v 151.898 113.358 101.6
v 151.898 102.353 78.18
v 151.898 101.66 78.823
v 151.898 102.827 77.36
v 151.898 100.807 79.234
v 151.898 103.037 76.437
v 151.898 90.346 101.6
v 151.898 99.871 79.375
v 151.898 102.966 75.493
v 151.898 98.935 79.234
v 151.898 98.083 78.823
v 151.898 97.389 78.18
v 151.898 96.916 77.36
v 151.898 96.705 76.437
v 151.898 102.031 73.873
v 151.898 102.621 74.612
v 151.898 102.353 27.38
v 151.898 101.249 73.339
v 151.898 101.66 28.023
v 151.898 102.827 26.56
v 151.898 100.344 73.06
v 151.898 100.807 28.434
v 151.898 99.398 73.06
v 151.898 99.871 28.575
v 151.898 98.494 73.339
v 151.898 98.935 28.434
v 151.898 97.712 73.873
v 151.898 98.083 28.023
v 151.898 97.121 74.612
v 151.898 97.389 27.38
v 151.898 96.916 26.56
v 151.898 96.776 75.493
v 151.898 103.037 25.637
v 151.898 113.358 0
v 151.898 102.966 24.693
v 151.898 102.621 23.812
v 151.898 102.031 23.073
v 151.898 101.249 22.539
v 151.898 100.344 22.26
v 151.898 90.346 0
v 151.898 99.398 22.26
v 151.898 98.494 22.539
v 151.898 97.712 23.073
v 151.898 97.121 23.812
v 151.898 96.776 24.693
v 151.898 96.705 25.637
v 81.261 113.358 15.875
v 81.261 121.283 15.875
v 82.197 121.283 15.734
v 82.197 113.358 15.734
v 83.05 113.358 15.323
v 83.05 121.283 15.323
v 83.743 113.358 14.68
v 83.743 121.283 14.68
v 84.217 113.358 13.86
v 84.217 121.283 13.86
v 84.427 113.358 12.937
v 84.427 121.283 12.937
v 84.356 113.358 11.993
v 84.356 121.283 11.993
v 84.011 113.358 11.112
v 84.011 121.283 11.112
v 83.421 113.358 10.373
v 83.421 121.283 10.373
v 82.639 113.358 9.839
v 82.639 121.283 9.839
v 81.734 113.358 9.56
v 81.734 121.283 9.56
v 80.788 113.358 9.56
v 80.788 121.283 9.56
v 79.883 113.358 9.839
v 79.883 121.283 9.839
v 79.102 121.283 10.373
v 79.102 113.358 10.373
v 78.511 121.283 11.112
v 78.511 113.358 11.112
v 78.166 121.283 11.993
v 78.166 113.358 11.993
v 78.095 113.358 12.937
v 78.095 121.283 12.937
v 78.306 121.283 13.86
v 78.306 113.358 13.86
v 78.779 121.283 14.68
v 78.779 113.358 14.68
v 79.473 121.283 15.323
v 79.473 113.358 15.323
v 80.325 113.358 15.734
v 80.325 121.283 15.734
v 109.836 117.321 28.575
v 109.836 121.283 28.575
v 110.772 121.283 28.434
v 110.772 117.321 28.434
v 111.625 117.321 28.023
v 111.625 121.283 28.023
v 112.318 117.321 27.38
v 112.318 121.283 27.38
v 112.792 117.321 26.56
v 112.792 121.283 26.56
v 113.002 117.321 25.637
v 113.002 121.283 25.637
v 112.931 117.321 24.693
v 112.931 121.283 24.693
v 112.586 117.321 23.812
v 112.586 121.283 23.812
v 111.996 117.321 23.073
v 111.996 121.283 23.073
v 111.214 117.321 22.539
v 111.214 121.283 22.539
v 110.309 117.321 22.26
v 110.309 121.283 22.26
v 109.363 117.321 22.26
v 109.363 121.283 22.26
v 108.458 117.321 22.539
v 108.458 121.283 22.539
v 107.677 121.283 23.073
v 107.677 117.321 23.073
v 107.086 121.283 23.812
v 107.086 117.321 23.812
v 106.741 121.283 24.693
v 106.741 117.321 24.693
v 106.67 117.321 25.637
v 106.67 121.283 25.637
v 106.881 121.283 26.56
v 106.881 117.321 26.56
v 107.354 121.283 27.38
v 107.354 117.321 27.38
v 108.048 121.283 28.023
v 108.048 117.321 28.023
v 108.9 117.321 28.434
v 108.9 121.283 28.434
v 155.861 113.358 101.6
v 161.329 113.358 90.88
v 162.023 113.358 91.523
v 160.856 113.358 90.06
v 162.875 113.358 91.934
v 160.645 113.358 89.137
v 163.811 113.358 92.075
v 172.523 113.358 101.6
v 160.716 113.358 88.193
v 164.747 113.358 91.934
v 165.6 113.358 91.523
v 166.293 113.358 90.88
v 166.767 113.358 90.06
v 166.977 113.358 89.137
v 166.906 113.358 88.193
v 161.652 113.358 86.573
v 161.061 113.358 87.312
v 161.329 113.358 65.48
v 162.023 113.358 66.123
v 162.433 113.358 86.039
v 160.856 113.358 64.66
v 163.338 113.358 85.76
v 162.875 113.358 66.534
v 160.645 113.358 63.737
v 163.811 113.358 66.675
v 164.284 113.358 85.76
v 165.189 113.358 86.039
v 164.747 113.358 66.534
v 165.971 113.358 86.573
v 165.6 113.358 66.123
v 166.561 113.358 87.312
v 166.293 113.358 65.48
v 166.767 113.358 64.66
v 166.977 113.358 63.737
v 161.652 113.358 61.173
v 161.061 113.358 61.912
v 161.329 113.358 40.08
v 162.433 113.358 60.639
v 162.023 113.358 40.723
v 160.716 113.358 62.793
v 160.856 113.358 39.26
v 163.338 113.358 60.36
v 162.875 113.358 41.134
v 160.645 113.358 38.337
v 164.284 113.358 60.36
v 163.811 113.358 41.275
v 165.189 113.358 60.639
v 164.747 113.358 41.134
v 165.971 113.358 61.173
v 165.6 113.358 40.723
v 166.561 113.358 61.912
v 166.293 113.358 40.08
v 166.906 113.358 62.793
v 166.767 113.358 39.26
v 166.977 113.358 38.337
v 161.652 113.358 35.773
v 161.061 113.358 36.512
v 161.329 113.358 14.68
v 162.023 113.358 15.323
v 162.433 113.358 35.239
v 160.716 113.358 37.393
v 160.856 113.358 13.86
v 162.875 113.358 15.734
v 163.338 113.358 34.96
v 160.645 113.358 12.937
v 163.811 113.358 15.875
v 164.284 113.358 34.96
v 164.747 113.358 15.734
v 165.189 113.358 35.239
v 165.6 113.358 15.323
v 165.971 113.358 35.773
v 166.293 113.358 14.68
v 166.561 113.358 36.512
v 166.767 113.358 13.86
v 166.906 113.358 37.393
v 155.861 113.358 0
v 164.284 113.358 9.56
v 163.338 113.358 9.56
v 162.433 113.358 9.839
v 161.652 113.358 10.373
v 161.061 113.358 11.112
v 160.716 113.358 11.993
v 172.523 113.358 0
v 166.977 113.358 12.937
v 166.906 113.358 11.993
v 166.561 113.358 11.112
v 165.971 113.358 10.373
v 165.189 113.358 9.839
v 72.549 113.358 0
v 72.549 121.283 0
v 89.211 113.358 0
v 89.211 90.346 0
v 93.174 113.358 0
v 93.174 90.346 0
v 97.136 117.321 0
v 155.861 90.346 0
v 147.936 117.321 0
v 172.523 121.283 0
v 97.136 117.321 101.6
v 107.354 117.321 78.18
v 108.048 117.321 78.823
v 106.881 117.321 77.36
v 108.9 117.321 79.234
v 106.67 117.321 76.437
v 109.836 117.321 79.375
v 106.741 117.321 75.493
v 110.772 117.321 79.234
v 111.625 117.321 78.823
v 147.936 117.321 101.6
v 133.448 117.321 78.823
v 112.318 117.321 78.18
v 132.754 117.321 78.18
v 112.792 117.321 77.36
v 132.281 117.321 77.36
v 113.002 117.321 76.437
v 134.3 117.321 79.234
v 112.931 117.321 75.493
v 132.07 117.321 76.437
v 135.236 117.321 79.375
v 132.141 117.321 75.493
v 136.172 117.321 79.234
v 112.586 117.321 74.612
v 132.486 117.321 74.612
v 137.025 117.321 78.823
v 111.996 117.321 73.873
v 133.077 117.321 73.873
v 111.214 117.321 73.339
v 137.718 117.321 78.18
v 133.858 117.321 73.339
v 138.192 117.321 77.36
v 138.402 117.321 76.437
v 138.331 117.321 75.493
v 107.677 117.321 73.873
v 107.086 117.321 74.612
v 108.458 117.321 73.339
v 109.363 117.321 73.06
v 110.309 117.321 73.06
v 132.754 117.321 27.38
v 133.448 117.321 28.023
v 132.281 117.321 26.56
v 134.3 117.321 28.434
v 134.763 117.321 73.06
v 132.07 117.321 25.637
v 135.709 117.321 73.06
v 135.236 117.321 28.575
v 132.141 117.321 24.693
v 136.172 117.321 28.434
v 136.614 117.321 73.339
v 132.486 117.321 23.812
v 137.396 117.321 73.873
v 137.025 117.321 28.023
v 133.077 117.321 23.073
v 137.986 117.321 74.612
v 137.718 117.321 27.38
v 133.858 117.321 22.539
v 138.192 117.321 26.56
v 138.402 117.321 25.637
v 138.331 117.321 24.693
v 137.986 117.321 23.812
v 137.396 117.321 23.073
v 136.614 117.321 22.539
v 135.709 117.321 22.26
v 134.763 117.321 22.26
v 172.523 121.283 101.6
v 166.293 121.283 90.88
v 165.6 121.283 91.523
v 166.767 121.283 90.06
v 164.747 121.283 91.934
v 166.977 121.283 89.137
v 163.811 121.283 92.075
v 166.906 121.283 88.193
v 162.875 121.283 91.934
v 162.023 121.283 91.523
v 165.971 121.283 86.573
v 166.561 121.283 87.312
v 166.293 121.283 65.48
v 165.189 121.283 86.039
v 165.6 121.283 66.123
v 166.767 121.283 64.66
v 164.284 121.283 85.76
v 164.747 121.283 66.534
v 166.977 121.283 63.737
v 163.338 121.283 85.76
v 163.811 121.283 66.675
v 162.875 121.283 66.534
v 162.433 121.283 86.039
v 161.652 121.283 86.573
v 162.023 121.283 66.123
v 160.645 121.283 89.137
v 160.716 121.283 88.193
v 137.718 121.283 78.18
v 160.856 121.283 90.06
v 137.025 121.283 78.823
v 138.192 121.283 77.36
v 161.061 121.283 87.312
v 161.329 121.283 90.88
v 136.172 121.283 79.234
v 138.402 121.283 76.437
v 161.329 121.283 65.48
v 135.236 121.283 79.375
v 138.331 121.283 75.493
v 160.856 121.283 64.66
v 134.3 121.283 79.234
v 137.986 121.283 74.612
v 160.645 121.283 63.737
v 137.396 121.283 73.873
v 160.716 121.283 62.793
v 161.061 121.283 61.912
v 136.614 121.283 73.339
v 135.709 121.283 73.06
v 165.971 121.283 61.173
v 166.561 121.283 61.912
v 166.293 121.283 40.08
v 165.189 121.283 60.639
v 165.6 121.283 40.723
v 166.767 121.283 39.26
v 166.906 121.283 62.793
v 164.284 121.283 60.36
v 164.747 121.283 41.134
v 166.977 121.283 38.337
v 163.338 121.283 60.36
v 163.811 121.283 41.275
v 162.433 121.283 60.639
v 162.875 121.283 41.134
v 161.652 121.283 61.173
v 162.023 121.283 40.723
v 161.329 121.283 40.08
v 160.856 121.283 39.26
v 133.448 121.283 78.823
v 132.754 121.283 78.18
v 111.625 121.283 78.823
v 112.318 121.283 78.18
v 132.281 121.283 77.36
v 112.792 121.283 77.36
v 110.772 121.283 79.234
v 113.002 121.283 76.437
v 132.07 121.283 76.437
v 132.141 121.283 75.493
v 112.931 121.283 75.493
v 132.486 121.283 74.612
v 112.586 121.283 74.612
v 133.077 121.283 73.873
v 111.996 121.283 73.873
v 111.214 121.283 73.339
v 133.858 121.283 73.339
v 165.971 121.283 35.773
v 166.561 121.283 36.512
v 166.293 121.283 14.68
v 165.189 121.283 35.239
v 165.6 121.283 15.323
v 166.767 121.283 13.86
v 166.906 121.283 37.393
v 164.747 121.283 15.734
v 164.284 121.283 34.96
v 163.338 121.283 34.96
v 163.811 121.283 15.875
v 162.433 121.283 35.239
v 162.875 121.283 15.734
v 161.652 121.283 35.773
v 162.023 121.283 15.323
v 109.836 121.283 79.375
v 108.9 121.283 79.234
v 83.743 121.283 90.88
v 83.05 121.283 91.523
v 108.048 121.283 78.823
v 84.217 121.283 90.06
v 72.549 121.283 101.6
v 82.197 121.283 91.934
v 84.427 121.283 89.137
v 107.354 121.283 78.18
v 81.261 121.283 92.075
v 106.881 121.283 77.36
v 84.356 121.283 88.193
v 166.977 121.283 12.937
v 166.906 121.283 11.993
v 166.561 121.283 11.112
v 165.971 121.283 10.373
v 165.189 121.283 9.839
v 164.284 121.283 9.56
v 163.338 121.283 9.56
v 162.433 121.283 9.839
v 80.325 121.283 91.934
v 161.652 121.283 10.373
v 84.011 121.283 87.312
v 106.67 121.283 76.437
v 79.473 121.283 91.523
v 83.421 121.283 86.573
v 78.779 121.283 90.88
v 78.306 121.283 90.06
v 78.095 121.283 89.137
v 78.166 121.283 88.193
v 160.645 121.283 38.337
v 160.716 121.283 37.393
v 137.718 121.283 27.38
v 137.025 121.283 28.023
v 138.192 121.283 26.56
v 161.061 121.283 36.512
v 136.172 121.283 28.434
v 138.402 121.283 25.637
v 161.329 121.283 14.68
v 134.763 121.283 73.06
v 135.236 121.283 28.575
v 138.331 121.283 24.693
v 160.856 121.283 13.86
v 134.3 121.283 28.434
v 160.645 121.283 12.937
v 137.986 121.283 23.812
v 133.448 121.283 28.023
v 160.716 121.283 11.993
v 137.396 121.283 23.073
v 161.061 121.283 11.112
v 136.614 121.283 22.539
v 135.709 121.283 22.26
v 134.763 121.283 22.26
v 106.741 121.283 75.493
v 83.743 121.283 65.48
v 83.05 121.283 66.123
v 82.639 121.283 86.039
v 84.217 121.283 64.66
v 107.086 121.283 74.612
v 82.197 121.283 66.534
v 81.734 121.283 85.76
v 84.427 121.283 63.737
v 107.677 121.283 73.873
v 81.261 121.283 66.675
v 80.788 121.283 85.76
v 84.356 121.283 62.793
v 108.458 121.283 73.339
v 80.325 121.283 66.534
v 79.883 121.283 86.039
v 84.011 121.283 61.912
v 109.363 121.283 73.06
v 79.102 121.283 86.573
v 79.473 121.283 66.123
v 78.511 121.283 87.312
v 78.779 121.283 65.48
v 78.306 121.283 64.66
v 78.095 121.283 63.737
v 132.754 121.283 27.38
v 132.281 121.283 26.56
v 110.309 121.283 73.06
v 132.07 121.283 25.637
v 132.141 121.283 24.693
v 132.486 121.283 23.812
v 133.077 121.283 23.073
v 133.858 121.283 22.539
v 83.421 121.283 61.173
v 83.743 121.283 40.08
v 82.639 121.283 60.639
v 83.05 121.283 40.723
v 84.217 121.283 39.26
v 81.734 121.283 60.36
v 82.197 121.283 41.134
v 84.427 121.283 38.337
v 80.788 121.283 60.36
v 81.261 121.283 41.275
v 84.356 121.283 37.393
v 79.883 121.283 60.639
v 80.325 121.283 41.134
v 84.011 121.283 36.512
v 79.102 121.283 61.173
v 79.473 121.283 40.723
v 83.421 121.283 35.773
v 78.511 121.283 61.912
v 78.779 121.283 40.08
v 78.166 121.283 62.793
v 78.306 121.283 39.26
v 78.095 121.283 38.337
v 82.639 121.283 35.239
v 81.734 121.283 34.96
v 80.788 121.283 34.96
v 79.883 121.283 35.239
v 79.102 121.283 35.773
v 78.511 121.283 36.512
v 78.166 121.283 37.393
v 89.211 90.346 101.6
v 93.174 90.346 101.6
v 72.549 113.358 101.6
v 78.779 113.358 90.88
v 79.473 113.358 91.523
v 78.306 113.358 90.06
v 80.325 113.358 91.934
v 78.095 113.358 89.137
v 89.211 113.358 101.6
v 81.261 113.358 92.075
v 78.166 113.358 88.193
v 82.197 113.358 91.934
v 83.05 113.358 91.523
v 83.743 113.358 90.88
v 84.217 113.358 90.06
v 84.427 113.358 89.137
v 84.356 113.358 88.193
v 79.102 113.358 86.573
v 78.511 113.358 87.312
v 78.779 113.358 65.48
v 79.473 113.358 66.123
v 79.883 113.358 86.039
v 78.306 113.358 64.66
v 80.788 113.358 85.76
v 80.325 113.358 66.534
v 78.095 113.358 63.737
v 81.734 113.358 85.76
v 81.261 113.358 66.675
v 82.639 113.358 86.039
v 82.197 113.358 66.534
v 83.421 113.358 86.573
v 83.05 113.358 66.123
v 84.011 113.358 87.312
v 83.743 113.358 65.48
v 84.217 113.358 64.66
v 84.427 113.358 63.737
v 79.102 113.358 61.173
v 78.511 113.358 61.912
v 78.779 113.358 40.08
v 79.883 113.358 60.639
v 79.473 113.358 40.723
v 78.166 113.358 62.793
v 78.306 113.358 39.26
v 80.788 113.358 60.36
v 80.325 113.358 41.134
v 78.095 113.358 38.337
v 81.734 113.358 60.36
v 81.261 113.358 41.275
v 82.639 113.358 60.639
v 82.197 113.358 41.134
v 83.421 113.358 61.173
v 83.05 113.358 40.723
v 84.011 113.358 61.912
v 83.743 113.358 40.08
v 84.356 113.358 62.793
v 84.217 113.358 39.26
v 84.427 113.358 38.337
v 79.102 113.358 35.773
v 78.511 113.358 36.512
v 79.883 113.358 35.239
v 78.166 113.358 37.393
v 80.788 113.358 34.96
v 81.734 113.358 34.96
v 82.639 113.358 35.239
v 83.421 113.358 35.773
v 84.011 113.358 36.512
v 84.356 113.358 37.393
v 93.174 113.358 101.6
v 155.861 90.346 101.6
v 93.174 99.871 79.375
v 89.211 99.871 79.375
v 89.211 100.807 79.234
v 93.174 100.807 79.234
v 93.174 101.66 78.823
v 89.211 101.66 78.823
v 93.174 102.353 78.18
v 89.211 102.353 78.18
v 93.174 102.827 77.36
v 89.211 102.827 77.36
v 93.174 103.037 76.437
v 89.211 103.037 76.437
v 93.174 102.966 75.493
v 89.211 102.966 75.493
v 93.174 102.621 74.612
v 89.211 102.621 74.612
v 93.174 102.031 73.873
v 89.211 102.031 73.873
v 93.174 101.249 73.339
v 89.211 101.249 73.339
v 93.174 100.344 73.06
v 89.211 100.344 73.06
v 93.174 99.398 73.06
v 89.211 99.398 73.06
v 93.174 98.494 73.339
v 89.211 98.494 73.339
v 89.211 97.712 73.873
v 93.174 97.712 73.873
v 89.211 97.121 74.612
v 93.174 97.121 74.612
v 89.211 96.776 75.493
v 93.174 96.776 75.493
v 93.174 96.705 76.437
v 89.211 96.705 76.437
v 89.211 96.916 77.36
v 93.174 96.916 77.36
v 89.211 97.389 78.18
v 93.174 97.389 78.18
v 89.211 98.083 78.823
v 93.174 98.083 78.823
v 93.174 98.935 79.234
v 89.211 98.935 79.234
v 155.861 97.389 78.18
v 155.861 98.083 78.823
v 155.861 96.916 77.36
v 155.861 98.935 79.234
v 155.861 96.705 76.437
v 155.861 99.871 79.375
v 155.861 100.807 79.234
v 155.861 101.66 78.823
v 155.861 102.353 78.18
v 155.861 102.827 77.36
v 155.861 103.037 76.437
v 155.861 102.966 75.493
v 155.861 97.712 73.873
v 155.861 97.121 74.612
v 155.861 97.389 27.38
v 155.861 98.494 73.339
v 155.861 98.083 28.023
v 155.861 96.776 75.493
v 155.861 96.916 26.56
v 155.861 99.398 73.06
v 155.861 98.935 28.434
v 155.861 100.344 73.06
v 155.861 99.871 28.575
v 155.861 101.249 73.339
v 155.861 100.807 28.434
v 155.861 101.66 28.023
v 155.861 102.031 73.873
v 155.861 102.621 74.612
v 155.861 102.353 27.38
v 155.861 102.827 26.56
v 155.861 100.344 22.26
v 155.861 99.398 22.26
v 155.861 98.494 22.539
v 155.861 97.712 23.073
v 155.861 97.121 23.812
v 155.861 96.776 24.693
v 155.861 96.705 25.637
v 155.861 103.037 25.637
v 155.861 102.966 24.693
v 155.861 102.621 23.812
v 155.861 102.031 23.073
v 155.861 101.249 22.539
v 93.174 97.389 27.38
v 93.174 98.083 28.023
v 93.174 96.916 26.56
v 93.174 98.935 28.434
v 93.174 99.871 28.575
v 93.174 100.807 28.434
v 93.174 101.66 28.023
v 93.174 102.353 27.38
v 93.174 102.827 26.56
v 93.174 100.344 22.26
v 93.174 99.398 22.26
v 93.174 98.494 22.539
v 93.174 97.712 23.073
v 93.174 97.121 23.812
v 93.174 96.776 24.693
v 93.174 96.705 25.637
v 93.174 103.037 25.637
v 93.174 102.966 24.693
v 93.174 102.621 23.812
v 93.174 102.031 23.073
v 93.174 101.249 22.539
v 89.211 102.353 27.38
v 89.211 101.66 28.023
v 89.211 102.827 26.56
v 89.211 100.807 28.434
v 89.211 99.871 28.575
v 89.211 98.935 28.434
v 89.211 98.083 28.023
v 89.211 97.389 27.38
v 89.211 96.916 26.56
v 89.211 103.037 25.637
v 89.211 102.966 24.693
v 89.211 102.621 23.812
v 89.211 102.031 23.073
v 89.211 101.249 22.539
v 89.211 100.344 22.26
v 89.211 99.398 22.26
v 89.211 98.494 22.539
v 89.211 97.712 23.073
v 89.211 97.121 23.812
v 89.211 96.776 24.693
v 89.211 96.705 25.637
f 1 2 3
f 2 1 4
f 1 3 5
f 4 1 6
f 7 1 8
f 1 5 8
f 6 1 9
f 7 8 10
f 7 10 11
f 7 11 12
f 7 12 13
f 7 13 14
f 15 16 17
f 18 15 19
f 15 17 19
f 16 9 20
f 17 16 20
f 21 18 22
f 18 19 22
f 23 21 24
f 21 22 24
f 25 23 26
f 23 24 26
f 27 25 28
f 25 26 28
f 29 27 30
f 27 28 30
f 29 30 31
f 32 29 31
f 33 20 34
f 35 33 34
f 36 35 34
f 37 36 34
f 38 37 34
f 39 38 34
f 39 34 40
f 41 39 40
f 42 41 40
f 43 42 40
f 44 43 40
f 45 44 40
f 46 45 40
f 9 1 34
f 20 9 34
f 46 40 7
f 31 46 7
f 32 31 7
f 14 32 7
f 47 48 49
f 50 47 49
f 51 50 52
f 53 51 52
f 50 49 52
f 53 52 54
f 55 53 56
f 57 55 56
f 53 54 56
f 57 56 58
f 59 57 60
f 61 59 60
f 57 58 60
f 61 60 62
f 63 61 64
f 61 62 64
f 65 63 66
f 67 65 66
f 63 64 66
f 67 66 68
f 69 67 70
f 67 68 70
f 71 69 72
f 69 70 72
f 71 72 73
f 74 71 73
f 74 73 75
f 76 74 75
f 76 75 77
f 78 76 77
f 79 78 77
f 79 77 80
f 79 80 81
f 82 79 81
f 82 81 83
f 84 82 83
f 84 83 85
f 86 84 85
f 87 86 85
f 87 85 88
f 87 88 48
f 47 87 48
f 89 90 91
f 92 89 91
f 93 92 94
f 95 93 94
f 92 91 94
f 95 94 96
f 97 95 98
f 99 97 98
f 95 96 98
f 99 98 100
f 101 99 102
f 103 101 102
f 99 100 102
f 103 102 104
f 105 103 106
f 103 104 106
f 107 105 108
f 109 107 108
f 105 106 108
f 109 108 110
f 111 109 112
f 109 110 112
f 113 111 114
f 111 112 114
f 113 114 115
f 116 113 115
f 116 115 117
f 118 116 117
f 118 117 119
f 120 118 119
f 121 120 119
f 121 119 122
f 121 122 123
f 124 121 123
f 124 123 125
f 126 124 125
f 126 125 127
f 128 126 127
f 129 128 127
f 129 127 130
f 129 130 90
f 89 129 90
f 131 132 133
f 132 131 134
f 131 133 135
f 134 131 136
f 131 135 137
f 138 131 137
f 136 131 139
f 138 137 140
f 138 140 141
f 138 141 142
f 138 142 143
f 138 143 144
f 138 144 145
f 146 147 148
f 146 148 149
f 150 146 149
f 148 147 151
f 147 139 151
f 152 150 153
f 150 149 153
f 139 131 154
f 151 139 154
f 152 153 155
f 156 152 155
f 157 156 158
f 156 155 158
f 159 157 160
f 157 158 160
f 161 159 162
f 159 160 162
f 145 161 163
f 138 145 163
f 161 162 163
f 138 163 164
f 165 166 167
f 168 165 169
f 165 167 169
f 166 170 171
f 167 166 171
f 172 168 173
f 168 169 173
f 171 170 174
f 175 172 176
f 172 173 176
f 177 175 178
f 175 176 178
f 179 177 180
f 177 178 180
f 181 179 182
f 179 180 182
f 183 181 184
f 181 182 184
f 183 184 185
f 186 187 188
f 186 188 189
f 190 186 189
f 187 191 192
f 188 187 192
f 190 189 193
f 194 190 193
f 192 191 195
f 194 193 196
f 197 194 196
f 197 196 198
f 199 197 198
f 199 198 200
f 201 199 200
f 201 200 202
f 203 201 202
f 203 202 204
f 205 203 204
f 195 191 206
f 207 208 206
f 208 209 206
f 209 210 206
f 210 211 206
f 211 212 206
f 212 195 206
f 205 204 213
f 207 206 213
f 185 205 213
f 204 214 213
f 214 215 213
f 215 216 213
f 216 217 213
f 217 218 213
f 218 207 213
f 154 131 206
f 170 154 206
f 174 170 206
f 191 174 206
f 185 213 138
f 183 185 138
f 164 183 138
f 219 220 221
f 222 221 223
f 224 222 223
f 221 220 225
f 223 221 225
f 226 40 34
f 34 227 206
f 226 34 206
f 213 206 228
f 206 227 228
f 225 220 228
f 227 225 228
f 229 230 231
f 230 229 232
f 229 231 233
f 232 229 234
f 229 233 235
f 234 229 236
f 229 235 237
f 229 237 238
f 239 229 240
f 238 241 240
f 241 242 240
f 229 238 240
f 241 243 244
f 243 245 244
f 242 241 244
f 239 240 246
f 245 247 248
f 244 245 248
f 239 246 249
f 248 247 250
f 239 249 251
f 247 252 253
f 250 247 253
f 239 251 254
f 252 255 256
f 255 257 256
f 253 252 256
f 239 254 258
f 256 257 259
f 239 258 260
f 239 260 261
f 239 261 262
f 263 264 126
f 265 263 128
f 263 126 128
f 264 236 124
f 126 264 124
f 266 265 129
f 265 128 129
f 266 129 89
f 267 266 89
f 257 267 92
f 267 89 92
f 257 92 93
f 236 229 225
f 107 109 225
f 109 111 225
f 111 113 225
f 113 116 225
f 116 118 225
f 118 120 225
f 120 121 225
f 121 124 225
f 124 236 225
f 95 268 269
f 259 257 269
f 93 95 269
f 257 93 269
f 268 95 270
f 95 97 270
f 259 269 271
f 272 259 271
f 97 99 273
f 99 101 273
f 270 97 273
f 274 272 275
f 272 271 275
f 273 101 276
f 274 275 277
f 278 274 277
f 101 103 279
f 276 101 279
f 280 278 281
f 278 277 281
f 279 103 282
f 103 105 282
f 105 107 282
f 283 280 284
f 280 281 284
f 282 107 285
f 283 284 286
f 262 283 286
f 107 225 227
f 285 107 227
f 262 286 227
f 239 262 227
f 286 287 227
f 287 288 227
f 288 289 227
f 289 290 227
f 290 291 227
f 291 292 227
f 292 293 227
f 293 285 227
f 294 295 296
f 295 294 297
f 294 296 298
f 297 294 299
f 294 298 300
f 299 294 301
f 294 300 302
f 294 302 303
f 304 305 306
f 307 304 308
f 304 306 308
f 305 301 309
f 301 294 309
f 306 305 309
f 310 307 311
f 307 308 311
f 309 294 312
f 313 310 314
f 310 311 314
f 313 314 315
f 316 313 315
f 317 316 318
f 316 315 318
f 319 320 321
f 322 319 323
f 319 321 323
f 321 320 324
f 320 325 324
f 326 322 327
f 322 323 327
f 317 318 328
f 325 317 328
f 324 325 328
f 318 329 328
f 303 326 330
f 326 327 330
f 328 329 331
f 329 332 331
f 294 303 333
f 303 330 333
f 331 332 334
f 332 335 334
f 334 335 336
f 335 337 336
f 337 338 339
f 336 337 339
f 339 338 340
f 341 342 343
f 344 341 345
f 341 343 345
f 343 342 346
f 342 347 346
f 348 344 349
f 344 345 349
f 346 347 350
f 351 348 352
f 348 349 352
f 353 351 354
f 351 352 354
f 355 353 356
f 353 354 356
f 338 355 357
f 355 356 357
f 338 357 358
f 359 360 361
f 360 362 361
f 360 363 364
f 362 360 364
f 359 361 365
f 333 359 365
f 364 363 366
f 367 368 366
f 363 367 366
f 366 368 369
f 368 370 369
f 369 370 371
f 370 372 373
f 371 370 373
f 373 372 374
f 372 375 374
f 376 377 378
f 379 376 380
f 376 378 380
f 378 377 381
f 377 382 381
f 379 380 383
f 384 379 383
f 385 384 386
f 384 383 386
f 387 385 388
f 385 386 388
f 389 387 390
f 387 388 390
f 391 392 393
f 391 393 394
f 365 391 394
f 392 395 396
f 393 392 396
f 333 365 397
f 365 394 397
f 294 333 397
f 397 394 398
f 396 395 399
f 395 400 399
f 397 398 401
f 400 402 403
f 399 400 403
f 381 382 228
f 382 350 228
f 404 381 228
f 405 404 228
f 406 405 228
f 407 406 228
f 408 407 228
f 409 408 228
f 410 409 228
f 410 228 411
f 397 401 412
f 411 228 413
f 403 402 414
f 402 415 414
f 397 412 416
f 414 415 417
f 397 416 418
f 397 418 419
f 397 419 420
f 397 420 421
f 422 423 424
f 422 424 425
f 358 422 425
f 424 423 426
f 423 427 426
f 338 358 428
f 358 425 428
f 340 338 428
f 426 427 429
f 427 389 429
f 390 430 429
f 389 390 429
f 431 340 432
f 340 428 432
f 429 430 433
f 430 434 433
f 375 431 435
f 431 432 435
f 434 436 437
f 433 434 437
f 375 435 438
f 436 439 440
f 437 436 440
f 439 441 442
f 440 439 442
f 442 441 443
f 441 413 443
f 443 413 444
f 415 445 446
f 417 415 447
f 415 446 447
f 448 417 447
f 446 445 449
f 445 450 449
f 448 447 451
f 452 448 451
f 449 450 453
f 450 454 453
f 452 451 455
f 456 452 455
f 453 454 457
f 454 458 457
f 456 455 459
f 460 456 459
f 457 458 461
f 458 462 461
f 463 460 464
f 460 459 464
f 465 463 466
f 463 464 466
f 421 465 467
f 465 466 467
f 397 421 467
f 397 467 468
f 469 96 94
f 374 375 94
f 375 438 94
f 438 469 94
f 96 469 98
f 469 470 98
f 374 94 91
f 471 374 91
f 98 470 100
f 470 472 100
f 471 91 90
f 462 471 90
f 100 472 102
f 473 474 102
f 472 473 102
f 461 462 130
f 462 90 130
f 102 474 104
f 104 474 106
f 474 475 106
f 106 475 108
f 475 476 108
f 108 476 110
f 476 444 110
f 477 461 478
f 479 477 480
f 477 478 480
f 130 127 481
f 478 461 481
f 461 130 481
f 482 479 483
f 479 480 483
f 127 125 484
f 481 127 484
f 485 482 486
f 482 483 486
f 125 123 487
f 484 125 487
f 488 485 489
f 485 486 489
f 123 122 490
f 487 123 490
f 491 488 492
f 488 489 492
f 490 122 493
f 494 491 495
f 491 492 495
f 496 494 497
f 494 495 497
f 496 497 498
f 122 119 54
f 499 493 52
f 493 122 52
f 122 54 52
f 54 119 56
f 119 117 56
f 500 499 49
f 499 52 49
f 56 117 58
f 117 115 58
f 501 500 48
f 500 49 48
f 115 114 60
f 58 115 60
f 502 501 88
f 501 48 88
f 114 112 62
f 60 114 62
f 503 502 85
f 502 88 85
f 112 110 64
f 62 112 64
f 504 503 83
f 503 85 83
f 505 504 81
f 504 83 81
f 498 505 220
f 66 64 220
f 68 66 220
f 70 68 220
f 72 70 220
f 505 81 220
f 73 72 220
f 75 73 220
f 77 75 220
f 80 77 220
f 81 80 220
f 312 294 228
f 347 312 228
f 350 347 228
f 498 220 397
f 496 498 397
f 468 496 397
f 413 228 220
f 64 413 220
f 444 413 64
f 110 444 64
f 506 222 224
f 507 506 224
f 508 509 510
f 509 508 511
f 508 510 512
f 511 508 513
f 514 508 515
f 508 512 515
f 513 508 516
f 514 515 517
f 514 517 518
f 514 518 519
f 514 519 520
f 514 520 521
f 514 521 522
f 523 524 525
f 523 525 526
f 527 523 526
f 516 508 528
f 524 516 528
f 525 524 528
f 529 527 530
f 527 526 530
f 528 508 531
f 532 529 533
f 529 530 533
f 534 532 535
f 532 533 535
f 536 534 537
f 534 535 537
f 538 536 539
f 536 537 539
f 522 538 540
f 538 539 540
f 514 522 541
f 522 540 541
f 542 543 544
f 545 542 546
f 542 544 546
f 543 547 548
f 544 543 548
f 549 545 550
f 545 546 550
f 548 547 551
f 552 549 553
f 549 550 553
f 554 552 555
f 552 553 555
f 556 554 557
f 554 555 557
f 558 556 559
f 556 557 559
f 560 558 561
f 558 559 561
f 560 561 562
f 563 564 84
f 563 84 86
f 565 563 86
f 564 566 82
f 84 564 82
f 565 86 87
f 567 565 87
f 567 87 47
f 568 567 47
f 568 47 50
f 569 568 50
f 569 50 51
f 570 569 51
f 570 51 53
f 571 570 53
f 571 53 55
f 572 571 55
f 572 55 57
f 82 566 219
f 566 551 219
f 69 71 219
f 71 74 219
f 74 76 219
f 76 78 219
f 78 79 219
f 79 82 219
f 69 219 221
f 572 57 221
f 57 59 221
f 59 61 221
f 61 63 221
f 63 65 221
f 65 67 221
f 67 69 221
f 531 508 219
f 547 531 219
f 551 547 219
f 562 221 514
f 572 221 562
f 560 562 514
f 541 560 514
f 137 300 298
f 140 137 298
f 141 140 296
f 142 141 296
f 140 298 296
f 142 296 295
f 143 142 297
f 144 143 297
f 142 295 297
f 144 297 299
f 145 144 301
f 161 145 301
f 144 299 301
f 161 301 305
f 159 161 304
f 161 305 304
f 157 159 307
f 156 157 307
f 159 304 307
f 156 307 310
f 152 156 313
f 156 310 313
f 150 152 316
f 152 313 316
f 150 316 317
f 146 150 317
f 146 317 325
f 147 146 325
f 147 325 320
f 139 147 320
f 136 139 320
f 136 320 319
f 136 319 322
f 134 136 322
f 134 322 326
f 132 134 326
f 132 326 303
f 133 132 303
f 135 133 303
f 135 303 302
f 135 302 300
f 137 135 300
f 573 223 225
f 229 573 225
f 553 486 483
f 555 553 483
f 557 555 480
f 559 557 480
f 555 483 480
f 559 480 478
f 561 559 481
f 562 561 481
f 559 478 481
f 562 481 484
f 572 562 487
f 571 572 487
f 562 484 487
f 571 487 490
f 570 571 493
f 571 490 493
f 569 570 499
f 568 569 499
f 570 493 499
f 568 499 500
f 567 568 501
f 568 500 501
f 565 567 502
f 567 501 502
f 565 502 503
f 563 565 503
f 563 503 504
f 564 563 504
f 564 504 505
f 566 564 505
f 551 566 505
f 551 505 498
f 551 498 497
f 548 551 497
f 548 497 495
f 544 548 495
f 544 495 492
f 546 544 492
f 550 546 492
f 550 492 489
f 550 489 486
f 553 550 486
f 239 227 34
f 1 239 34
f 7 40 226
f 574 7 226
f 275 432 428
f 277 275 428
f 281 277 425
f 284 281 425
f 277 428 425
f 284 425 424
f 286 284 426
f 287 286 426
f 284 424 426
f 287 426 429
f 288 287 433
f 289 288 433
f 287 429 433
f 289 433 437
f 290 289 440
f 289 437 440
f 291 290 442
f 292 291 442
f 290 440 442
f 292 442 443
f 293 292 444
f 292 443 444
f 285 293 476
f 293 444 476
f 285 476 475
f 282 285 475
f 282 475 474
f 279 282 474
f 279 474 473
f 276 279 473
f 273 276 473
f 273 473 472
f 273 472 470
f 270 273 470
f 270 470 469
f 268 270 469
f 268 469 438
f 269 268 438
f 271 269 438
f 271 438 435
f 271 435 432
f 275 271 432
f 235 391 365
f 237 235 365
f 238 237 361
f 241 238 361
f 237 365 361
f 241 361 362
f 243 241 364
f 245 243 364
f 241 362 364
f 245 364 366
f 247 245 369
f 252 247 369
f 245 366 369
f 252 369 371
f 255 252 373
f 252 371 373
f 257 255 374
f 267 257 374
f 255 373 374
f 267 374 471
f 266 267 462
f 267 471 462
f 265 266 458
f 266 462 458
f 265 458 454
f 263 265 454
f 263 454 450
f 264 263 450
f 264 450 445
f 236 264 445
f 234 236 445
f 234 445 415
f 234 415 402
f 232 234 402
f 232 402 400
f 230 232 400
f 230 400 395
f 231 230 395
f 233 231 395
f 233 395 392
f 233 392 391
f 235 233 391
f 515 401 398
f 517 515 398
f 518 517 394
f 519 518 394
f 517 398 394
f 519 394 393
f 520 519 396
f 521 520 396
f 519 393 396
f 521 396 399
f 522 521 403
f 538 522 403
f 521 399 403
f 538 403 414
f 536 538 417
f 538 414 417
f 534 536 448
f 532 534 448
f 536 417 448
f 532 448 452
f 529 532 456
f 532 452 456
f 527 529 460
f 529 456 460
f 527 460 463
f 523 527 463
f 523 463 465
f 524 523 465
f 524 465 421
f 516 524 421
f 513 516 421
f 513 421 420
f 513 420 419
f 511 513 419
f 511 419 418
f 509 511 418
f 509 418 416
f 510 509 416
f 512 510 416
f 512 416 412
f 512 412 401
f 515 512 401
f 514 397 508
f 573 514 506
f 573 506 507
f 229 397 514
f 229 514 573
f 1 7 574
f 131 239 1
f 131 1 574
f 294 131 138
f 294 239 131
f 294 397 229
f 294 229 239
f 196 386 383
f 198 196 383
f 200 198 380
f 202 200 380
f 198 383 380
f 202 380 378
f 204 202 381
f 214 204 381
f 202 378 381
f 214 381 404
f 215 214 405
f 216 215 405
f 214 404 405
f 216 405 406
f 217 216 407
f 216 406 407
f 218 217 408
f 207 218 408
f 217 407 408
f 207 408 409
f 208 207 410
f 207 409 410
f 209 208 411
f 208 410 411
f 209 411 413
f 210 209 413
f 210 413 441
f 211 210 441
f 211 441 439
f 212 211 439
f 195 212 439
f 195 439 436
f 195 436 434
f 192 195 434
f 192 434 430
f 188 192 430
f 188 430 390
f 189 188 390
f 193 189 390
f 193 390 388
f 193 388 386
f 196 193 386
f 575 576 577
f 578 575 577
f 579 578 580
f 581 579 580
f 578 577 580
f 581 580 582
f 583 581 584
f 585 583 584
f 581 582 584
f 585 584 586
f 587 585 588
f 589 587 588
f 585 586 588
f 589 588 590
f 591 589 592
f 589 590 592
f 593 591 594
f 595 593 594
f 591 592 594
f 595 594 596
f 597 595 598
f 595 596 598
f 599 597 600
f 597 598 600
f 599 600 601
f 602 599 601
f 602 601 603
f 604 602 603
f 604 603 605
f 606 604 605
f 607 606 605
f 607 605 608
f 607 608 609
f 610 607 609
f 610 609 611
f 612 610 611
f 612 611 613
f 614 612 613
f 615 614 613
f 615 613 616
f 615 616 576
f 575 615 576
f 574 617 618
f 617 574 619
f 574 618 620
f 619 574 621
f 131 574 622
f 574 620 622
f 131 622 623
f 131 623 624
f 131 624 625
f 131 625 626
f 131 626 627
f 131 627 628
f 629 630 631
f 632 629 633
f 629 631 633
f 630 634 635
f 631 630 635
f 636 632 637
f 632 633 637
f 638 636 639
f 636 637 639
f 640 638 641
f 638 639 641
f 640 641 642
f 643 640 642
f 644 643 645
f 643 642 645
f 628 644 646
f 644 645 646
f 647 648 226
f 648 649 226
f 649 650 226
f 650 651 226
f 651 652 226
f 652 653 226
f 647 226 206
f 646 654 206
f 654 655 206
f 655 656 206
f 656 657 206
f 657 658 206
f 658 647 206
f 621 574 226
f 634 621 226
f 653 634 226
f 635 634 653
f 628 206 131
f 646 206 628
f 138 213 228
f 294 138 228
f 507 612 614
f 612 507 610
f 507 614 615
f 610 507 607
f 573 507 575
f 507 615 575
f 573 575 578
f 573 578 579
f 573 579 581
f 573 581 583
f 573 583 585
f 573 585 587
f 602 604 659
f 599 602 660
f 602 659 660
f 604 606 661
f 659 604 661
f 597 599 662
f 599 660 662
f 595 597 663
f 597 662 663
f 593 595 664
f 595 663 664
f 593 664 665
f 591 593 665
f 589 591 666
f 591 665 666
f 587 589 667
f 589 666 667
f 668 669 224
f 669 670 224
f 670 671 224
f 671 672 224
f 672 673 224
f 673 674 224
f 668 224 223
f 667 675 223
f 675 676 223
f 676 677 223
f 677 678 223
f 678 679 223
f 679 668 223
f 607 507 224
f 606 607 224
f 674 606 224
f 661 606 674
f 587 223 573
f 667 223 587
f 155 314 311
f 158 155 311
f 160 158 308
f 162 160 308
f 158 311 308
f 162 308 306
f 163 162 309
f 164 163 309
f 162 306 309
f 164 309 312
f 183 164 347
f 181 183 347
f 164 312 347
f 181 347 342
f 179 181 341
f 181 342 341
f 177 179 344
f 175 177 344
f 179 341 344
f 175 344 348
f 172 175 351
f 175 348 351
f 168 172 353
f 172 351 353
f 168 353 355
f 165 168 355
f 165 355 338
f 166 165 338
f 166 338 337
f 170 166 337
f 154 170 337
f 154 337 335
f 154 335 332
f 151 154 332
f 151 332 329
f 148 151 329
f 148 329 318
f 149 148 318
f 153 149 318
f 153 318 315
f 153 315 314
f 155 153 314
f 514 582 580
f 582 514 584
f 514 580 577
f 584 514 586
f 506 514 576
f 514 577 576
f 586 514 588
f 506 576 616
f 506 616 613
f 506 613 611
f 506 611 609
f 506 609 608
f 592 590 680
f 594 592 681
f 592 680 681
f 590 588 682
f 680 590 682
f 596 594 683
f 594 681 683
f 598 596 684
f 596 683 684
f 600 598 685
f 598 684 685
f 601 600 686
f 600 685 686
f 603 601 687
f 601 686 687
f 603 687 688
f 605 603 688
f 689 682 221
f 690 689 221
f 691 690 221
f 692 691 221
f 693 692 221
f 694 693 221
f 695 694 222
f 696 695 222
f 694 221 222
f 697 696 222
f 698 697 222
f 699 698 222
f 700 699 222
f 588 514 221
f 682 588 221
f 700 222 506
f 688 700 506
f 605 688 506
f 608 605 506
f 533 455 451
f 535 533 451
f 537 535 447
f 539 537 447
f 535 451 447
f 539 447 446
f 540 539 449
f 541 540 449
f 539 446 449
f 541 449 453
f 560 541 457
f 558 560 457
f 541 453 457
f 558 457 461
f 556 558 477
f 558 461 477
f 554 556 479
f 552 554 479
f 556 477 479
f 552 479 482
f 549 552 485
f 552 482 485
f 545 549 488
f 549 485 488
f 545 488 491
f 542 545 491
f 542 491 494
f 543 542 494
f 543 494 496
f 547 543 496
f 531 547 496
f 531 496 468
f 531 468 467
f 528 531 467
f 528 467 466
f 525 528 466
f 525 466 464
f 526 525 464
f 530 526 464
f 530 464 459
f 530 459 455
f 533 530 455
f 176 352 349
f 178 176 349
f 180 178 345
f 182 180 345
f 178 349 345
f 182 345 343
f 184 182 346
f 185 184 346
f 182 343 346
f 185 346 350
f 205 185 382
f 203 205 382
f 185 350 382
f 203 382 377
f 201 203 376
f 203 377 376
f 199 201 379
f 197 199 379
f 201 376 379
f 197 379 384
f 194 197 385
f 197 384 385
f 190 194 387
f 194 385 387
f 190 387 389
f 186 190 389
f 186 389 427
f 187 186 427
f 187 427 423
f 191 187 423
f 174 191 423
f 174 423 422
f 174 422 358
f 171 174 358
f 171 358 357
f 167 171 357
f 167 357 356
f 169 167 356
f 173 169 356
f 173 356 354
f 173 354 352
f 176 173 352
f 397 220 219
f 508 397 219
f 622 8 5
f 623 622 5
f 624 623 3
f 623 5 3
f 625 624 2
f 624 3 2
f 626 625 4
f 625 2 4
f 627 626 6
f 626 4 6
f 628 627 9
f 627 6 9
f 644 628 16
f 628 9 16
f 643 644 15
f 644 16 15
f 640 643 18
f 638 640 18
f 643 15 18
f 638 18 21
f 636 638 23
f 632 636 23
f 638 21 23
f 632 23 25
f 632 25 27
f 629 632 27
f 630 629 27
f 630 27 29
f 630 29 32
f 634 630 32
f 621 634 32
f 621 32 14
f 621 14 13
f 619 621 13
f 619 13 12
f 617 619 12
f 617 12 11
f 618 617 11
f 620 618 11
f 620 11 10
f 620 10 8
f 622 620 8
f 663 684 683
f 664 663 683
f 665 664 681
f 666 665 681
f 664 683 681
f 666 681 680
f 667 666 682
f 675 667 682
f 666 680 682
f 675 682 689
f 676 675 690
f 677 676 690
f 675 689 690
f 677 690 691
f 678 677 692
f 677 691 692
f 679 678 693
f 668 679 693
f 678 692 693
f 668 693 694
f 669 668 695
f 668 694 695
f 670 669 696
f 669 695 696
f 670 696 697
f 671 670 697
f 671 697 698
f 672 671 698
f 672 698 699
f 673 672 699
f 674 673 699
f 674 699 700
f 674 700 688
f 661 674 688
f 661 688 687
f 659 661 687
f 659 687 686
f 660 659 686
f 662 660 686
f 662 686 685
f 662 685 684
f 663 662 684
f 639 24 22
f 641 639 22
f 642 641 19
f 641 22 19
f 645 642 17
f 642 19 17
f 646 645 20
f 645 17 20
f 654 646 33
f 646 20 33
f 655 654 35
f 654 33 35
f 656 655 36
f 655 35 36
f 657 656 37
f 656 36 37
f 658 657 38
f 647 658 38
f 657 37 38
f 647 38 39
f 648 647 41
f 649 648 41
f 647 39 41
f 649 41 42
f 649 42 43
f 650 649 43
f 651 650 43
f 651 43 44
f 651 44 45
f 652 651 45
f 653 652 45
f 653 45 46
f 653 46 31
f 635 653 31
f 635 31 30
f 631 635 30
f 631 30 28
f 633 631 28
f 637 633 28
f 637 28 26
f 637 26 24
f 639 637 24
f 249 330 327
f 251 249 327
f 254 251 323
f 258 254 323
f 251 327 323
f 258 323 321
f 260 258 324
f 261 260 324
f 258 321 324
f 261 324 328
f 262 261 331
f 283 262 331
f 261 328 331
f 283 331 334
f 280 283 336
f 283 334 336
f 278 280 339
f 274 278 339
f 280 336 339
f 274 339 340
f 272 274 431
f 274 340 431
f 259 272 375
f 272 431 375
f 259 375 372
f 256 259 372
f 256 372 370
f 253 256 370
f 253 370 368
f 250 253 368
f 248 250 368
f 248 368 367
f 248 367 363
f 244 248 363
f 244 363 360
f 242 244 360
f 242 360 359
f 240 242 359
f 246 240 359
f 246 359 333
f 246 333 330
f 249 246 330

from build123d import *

# Parameters (mm, degrees)
BOSS_EXTRUDE1_DEPTH = 101.6
SKETCH2_R           = 3.175
CUT_EXTRUDE1_DEPTH  = 203.593055017
SKETCH3_R           = 3.175
CUT_EXTRUDE2_DEPTH  = 203.593055017
SKETCH4_R           = 3.175
CUT_EXTRUDE3_DEPTH  = 179.810196235


with BuildPart() as part:
    # Model → Boss-Extrude1 (new body)
    with BuildSketch(Plane.XY):
        Polygon((93.173661033, 113.358492063), (97.136061033, 117.320892063), (147.936061033, 117.320892063), (151.898461033, 113.358492063), (151.898461033, 90.346092063), (155.860861033, 90.346092063), (155.860861033, 113.358492063), (172.523261033, 113.358492063), (172.523261033, 121.283292063), (72.548861033, 121.283292063), (72.548861033, 113.358492063), (89.211261033, 113.358492063), (89.211261033, 90.346092063), (93.173661033, 90.346092063), align=None)
    extrude(amount=BOSS_EXTRUDE1_DEPTH)

    # Sketch2 → Cut-Extrude1 (cut, through all)
    with BuildSketch(Plane(origin=(0, 121.283292063, 0), x_dir=(1, 0, 0), z_dir=(0, 1, 0))):
        with Locations(Location((163.811061033, -12.7, 0), (0, 0, 270))):
            Circle(SKETCH2_R)
        with Locations(Location((163.811061033, -38.1, 0), (0, 0, 270))):
            Circle(SKETCH2_R)
        with Locations(Location((163.811061033, -63.5, 0), (0, 0, 270))):
            Circle(SKETCH2_R)
        with Locations(Location((163.811061033, -88.9, 0), (0, 0, 270))):
            Circle(SKETCH2_R)
        with Locations(Location((81.261061033, -38.1, 0), (0, 0, 270))):
            Circle(SKETCH2_R)
        with Locations(Location((81.261061033, -63.5, 0), (0, 0, 270))):
            Circle(SKETCH2_R)
        with Locations(Location((81.261061033, -88.9, 0), (0, 0, 270))):
            Circle(SKETCH2_R)
        with Locations(Location((81.261061033, -12.7, 0), (0, 0, 270))):
            Circle(SKETCH2_R)
    extrude(amount=-CUT_EXTRUDE1_DEPTH, mode=Mode.SUBTRACT)

    # Sketch3 → Cut-Extrude2 (cut, through all)
    with BuildSketch(Plane(origin=(0, 121.283292063, 0), x_dir=(1, 0, 0), z_dir=(0, 1, 0))):
        with Locations(Location((135.236061033, -25.4, 0), (0, 0, 270))):
            Circle(SKETCH3_R)
        with Locations(Location((109.836061033, -25.4, 0), (0, 0, 270))):
            Circle(SKETCH3_R)
        with Locations(Location((109.836061033, -76.2, 0), (0, 0, 270))):
            Circle(SKETCH3_R)
        with Locations(Location((135.236061033, -76.2, 0), (0, 0, 270))):
            Circle(SKETCH3_R)
    extrude(amount=-CUT_EXTRUDE2_DEPTH, mode=Mode.SUBTRACT)

    # Sketch4 → Cut-Extrude3 (cut, through all)
    with BuildSketch(Plane.ZY.offset(-89.211261033)):
        with Locations((25.4, 99.871092063)):
            Circle(SKETCH4_R)
        with Locations((76.2, 99.871092063)):
            Circle(SKETCH4_R)
    extrude(amount=-CUT_EXTRUDE3_DEPTH, mode=Mode.SUBTRACT)


solid = part.part
